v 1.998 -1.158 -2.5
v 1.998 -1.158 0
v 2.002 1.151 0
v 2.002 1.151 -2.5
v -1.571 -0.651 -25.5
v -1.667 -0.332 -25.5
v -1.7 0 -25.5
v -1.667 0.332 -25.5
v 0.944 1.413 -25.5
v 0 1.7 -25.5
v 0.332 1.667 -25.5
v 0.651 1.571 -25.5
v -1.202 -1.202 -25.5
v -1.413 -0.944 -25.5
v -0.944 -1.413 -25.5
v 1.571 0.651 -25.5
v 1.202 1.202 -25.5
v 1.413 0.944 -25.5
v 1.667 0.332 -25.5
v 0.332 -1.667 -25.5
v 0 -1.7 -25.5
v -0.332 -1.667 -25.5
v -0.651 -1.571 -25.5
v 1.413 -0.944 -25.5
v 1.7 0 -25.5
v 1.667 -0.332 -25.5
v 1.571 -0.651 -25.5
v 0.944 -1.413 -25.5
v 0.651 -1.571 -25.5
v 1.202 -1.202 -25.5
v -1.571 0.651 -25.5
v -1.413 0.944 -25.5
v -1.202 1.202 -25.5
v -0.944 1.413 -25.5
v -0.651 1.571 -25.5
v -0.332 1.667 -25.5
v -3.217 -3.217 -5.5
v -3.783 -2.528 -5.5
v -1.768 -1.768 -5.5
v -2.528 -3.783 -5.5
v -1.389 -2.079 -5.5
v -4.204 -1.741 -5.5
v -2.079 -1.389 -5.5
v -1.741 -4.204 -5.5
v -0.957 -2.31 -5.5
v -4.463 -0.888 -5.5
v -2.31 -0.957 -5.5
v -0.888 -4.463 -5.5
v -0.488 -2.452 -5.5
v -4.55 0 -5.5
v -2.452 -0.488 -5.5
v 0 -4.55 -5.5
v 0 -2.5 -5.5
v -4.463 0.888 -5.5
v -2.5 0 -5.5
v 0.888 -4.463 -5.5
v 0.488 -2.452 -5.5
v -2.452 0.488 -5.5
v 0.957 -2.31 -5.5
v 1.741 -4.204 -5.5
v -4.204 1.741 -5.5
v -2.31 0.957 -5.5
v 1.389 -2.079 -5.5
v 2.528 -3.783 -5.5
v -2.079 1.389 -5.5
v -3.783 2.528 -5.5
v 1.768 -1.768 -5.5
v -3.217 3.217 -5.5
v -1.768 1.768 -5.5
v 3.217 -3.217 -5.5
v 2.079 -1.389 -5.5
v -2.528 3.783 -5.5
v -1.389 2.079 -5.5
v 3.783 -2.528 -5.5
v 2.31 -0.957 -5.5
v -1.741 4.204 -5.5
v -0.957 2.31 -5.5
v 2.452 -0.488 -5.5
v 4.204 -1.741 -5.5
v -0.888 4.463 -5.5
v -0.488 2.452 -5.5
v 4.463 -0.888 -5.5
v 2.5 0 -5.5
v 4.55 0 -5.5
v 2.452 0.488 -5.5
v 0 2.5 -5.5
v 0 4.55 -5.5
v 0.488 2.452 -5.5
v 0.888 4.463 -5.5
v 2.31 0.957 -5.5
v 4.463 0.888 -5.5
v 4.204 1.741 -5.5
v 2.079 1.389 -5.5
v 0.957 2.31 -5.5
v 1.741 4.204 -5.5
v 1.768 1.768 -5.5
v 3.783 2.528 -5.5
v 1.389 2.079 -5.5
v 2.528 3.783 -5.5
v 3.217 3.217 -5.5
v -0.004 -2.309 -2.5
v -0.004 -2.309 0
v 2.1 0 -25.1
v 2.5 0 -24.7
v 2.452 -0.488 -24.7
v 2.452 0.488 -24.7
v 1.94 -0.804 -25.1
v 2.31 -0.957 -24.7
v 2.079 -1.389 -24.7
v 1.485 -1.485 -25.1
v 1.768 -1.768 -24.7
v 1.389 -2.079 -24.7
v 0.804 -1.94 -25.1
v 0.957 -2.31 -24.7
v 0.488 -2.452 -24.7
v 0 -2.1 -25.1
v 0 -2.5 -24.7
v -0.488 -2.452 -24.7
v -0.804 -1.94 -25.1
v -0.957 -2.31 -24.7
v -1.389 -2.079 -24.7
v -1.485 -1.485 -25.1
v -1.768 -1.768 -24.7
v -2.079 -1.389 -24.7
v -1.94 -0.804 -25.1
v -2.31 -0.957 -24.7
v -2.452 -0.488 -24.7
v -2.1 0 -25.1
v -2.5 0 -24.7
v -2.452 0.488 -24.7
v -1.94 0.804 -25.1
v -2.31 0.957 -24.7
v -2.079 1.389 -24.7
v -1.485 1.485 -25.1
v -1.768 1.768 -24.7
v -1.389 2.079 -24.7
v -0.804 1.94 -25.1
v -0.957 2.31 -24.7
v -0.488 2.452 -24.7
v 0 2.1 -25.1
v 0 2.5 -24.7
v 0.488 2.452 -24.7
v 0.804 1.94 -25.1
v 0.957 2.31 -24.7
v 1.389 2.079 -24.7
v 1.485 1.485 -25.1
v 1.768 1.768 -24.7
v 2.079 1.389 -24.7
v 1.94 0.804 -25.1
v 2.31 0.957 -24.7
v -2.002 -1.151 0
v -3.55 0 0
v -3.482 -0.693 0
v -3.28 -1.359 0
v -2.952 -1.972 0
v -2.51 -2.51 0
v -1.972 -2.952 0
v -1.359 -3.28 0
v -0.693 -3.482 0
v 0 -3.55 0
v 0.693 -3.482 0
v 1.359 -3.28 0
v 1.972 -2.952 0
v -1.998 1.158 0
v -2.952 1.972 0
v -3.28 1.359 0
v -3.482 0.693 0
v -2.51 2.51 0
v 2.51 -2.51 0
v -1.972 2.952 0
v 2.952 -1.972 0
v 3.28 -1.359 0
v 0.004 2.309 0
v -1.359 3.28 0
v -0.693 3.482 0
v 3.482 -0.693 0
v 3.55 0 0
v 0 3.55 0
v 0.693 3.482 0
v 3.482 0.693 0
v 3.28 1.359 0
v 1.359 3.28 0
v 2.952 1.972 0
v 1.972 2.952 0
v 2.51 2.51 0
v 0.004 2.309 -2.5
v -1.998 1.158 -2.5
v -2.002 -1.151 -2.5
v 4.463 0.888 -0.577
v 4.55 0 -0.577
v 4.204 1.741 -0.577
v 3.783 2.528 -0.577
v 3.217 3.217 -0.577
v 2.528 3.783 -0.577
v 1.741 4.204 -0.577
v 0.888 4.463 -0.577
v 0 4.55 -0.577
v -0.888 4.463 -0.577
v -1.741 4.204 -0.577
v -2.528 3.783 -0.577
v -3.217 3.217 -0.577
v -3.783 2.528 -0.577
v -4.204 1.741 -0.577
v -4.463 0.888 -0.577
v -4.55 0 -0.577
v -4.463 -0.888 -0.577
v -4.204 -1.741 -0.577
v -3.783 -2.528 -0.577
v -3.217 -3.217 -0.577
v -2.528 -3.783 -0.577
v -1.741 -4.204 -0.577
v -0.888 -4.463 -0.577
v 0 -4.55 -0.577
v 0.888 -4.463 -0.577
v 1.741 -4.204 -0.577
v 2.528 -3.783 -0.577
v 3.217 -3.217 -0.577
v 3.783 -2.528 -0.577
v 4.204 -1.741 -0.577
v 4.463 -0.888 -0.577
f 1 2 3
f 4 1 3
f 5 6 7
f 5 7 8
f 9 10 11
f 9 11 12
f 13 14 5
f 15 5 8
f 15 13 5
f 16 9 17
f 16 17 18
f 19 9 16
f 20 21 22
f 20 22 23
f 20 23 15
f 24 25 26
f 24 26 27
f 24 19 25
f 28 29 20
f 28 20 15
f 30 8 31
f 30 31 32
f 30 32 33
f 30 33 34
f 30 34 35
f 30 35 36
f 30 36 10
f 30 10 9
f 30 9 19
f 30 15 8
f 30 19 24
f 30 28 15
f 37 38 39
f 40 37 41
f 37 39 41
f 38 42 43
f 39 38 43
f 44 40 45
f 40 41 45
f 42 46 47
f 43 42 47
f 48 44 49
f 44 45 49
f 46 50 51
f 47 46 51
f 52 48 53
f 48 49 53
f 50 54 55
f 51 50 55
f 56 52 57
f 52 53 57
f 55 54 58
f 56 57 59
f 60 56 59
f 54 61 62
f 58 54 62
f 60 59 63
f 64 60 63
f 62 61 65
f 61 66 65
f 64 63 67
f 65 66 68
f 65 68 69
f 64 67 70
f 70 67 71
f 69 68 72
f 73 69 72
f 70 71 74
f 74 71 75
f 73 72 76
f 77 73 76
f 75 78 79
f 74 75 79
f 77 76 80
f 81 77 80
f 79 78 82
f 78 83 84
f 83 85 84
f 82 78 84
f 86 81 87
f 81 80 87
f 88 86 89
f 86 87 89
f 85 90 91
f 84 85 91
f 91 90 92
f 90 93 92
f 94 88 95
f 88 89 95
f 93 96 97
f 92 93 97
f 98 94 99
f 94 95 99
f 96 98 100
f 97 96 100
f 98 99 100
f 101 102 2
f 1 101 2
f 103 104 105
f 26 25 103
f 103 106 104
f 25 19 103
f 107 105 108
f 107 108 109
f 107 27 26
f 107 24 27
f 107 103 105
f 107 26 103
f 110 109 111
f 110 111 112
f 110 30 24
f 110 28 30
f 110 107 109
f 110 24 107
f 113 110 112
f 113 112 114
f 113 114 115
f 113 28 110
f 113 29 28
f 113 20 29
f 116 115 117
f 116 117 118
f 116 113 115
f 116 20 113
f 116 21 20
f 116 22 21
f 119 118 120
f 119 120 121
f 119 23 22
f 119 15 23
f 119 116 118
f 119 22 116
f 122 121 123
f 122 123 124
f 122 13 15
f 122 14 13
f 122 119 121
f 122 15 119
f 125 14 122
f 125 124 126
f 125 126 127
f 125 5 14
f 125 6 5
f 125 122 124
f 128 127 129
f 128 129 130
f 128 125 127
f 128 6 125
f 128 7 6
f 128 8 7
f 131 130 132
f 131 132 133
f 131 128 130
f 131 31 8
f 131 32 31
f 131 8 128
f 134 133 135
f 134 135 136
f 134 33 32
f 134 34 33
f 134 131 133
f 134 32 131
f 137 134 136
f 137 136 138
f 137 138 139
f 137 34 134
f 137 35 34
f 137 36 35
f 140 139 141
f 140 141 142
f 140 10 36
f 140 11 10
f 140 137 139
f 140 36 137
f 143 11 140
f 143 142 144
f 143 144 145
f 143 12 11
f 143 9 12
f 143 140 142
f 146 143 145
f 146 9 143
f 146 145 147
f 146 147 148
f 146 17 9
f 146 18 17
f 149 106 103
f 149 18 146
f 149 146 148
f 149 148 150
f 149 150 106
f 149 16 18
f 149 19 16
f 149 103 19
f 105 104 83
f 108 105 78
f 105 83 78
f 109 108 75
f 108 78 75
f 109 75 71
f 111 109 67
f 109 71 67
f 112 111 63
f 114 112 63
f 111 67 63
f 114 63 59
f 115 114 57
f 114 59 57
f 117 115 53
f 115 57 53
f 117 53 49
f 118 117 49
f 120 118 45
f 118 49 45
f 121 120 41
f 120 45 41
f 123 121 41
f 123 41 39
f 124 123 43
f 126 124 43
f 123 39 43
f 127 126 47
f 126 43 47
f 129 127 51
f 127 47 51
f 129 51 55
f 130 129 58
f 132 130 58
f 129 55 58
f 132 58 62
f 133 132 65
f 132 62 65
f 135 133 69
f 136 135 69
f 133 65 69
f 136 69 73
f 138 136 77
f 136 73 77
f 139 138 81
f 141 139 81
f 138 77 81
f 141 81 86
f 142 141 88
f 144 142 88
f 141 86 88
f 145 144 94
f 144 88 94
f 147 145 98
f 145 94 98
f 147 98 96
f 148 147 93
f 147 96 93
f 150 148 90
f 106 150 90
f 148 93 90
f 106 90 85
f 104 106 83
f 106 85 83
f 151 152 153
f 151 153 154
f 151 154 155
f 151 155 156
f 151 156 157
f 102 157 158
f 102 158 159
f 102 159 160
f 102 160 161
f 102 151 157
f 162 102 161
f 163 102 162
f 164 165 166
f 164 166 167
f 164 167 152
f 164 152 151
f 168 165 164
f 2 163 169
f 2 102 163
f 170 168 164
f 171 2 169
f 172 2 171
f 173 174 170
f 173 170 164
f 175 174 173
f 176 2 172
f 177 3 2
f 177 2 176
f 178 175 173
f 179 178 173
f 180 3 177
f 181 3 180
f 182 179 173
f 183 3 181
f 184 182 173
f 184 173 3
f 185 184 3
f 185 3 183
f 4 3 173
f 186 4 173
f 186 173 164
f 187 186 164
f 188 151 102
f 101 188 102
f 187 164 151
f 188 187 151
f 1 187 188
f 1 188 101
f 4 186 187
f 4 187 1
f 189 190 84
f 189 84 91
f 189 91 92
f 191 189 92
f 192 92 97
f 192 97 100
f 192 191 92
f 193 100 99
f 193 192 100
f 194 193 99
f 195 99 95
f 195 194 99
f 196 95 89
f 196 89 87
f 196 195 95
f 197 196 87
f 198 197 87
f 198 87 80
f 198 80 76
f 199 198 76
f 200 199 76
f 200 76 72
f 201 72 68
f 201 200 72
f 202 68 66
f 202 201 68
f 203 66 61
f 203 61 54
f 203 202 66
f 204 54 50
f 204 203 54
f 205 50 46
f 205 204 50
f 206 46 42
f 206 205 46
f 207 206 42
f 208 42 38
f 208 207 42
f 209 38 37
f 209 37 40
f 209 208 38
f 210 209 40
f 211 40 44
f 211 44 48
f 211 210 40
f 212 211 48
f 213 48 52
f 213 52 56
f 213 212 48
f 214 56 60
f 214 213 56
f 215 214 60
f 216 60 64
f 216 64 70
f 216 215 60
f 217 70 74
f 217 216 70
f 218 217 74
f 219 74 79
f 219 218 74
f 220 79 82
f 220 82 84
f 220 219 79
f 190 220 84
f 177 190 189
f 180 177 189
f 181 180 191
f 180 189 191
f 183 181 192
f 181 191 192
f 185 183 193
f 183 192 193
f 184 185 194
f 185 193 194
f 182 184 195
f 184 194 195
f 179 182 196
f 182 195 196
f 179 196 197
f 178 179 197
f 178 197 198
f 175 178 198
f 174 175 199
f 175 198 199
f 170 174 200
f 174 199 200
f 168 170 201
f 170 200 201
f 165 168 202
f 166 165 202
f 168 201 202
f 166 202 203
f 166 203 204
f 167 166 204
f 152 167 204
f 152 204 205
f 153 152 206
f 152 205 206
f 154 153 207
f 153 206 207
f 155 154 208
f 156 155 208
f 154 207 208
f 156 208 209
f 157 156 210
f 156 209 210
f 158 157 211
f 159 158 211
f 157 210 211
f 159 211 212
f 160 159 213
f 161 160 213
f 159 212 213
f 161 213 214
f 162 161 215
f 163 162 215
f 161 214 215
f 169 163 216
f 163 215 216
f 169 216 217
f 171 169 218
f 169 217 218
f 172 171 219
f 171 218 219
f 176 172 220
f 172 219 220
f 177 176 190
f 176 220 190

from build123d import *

# Parameters (mm, degrees)
F0_R     = 4.55
F1_DEPTH = 5.5
F2_R     = 2.5
F3_DEPTH = 20
F5_DEPTH = 2.5
F6_SIZE2 = 0.5773502692
F6_SIZE  = 1
F7_SIZE  = 0.8


with BuildPart() as f1:
    # F0 (on Top) → F1 (new body)
    with BuildSketch(Plane.XY):
        Circle(F0_R)
    extrude(amount=-F1_DEPTH)

    # F2 (on face) → F3 (join)
    with BuildSketch(Plane(origin=(0, 0, -5.5), x_dir=(1, 0, 0), z_dir=(0, 0, -1))):
        Circle(F2_R)
    extrude(amount=F3_DEPTH)

    # F4 (on face) → F5 (cut)
    with BuildSketch(Plane.XY):
        Polygon((-0.0040677853, -2.3093974943), (1.9979630048, -1.1582215525), (2.0020307901, 1.1511759417), (0.0040677853, 2.3093974943), (-1.9979630048, 1.1582215525), (-2.0020307901, -1.1511759417), align=None)
    extrude(amount=-F5_DEPTH, mode=Mode.SUBTRACT)

    # F6
    f6_edges = [f1.edges().sort_by_distance(p)[0] for p in [
        (-4.55, 0, 0),
    ]]
    f6_side = f1.faces().sort_by_distance((-4.421307, 0, 0))[0]
    chamfer(f6_edges, length=F6_SIZE, length2=F6_SIZE2, reference=f6_side)

    # F7
    f7_edges = [f1.edges().sort_by_distance(p)[0] for p in [
        (-2.5, 0, -25.5),
    ]]
    chamfer(f7_edges, length=F7_SIZE)


solid = f1.part
